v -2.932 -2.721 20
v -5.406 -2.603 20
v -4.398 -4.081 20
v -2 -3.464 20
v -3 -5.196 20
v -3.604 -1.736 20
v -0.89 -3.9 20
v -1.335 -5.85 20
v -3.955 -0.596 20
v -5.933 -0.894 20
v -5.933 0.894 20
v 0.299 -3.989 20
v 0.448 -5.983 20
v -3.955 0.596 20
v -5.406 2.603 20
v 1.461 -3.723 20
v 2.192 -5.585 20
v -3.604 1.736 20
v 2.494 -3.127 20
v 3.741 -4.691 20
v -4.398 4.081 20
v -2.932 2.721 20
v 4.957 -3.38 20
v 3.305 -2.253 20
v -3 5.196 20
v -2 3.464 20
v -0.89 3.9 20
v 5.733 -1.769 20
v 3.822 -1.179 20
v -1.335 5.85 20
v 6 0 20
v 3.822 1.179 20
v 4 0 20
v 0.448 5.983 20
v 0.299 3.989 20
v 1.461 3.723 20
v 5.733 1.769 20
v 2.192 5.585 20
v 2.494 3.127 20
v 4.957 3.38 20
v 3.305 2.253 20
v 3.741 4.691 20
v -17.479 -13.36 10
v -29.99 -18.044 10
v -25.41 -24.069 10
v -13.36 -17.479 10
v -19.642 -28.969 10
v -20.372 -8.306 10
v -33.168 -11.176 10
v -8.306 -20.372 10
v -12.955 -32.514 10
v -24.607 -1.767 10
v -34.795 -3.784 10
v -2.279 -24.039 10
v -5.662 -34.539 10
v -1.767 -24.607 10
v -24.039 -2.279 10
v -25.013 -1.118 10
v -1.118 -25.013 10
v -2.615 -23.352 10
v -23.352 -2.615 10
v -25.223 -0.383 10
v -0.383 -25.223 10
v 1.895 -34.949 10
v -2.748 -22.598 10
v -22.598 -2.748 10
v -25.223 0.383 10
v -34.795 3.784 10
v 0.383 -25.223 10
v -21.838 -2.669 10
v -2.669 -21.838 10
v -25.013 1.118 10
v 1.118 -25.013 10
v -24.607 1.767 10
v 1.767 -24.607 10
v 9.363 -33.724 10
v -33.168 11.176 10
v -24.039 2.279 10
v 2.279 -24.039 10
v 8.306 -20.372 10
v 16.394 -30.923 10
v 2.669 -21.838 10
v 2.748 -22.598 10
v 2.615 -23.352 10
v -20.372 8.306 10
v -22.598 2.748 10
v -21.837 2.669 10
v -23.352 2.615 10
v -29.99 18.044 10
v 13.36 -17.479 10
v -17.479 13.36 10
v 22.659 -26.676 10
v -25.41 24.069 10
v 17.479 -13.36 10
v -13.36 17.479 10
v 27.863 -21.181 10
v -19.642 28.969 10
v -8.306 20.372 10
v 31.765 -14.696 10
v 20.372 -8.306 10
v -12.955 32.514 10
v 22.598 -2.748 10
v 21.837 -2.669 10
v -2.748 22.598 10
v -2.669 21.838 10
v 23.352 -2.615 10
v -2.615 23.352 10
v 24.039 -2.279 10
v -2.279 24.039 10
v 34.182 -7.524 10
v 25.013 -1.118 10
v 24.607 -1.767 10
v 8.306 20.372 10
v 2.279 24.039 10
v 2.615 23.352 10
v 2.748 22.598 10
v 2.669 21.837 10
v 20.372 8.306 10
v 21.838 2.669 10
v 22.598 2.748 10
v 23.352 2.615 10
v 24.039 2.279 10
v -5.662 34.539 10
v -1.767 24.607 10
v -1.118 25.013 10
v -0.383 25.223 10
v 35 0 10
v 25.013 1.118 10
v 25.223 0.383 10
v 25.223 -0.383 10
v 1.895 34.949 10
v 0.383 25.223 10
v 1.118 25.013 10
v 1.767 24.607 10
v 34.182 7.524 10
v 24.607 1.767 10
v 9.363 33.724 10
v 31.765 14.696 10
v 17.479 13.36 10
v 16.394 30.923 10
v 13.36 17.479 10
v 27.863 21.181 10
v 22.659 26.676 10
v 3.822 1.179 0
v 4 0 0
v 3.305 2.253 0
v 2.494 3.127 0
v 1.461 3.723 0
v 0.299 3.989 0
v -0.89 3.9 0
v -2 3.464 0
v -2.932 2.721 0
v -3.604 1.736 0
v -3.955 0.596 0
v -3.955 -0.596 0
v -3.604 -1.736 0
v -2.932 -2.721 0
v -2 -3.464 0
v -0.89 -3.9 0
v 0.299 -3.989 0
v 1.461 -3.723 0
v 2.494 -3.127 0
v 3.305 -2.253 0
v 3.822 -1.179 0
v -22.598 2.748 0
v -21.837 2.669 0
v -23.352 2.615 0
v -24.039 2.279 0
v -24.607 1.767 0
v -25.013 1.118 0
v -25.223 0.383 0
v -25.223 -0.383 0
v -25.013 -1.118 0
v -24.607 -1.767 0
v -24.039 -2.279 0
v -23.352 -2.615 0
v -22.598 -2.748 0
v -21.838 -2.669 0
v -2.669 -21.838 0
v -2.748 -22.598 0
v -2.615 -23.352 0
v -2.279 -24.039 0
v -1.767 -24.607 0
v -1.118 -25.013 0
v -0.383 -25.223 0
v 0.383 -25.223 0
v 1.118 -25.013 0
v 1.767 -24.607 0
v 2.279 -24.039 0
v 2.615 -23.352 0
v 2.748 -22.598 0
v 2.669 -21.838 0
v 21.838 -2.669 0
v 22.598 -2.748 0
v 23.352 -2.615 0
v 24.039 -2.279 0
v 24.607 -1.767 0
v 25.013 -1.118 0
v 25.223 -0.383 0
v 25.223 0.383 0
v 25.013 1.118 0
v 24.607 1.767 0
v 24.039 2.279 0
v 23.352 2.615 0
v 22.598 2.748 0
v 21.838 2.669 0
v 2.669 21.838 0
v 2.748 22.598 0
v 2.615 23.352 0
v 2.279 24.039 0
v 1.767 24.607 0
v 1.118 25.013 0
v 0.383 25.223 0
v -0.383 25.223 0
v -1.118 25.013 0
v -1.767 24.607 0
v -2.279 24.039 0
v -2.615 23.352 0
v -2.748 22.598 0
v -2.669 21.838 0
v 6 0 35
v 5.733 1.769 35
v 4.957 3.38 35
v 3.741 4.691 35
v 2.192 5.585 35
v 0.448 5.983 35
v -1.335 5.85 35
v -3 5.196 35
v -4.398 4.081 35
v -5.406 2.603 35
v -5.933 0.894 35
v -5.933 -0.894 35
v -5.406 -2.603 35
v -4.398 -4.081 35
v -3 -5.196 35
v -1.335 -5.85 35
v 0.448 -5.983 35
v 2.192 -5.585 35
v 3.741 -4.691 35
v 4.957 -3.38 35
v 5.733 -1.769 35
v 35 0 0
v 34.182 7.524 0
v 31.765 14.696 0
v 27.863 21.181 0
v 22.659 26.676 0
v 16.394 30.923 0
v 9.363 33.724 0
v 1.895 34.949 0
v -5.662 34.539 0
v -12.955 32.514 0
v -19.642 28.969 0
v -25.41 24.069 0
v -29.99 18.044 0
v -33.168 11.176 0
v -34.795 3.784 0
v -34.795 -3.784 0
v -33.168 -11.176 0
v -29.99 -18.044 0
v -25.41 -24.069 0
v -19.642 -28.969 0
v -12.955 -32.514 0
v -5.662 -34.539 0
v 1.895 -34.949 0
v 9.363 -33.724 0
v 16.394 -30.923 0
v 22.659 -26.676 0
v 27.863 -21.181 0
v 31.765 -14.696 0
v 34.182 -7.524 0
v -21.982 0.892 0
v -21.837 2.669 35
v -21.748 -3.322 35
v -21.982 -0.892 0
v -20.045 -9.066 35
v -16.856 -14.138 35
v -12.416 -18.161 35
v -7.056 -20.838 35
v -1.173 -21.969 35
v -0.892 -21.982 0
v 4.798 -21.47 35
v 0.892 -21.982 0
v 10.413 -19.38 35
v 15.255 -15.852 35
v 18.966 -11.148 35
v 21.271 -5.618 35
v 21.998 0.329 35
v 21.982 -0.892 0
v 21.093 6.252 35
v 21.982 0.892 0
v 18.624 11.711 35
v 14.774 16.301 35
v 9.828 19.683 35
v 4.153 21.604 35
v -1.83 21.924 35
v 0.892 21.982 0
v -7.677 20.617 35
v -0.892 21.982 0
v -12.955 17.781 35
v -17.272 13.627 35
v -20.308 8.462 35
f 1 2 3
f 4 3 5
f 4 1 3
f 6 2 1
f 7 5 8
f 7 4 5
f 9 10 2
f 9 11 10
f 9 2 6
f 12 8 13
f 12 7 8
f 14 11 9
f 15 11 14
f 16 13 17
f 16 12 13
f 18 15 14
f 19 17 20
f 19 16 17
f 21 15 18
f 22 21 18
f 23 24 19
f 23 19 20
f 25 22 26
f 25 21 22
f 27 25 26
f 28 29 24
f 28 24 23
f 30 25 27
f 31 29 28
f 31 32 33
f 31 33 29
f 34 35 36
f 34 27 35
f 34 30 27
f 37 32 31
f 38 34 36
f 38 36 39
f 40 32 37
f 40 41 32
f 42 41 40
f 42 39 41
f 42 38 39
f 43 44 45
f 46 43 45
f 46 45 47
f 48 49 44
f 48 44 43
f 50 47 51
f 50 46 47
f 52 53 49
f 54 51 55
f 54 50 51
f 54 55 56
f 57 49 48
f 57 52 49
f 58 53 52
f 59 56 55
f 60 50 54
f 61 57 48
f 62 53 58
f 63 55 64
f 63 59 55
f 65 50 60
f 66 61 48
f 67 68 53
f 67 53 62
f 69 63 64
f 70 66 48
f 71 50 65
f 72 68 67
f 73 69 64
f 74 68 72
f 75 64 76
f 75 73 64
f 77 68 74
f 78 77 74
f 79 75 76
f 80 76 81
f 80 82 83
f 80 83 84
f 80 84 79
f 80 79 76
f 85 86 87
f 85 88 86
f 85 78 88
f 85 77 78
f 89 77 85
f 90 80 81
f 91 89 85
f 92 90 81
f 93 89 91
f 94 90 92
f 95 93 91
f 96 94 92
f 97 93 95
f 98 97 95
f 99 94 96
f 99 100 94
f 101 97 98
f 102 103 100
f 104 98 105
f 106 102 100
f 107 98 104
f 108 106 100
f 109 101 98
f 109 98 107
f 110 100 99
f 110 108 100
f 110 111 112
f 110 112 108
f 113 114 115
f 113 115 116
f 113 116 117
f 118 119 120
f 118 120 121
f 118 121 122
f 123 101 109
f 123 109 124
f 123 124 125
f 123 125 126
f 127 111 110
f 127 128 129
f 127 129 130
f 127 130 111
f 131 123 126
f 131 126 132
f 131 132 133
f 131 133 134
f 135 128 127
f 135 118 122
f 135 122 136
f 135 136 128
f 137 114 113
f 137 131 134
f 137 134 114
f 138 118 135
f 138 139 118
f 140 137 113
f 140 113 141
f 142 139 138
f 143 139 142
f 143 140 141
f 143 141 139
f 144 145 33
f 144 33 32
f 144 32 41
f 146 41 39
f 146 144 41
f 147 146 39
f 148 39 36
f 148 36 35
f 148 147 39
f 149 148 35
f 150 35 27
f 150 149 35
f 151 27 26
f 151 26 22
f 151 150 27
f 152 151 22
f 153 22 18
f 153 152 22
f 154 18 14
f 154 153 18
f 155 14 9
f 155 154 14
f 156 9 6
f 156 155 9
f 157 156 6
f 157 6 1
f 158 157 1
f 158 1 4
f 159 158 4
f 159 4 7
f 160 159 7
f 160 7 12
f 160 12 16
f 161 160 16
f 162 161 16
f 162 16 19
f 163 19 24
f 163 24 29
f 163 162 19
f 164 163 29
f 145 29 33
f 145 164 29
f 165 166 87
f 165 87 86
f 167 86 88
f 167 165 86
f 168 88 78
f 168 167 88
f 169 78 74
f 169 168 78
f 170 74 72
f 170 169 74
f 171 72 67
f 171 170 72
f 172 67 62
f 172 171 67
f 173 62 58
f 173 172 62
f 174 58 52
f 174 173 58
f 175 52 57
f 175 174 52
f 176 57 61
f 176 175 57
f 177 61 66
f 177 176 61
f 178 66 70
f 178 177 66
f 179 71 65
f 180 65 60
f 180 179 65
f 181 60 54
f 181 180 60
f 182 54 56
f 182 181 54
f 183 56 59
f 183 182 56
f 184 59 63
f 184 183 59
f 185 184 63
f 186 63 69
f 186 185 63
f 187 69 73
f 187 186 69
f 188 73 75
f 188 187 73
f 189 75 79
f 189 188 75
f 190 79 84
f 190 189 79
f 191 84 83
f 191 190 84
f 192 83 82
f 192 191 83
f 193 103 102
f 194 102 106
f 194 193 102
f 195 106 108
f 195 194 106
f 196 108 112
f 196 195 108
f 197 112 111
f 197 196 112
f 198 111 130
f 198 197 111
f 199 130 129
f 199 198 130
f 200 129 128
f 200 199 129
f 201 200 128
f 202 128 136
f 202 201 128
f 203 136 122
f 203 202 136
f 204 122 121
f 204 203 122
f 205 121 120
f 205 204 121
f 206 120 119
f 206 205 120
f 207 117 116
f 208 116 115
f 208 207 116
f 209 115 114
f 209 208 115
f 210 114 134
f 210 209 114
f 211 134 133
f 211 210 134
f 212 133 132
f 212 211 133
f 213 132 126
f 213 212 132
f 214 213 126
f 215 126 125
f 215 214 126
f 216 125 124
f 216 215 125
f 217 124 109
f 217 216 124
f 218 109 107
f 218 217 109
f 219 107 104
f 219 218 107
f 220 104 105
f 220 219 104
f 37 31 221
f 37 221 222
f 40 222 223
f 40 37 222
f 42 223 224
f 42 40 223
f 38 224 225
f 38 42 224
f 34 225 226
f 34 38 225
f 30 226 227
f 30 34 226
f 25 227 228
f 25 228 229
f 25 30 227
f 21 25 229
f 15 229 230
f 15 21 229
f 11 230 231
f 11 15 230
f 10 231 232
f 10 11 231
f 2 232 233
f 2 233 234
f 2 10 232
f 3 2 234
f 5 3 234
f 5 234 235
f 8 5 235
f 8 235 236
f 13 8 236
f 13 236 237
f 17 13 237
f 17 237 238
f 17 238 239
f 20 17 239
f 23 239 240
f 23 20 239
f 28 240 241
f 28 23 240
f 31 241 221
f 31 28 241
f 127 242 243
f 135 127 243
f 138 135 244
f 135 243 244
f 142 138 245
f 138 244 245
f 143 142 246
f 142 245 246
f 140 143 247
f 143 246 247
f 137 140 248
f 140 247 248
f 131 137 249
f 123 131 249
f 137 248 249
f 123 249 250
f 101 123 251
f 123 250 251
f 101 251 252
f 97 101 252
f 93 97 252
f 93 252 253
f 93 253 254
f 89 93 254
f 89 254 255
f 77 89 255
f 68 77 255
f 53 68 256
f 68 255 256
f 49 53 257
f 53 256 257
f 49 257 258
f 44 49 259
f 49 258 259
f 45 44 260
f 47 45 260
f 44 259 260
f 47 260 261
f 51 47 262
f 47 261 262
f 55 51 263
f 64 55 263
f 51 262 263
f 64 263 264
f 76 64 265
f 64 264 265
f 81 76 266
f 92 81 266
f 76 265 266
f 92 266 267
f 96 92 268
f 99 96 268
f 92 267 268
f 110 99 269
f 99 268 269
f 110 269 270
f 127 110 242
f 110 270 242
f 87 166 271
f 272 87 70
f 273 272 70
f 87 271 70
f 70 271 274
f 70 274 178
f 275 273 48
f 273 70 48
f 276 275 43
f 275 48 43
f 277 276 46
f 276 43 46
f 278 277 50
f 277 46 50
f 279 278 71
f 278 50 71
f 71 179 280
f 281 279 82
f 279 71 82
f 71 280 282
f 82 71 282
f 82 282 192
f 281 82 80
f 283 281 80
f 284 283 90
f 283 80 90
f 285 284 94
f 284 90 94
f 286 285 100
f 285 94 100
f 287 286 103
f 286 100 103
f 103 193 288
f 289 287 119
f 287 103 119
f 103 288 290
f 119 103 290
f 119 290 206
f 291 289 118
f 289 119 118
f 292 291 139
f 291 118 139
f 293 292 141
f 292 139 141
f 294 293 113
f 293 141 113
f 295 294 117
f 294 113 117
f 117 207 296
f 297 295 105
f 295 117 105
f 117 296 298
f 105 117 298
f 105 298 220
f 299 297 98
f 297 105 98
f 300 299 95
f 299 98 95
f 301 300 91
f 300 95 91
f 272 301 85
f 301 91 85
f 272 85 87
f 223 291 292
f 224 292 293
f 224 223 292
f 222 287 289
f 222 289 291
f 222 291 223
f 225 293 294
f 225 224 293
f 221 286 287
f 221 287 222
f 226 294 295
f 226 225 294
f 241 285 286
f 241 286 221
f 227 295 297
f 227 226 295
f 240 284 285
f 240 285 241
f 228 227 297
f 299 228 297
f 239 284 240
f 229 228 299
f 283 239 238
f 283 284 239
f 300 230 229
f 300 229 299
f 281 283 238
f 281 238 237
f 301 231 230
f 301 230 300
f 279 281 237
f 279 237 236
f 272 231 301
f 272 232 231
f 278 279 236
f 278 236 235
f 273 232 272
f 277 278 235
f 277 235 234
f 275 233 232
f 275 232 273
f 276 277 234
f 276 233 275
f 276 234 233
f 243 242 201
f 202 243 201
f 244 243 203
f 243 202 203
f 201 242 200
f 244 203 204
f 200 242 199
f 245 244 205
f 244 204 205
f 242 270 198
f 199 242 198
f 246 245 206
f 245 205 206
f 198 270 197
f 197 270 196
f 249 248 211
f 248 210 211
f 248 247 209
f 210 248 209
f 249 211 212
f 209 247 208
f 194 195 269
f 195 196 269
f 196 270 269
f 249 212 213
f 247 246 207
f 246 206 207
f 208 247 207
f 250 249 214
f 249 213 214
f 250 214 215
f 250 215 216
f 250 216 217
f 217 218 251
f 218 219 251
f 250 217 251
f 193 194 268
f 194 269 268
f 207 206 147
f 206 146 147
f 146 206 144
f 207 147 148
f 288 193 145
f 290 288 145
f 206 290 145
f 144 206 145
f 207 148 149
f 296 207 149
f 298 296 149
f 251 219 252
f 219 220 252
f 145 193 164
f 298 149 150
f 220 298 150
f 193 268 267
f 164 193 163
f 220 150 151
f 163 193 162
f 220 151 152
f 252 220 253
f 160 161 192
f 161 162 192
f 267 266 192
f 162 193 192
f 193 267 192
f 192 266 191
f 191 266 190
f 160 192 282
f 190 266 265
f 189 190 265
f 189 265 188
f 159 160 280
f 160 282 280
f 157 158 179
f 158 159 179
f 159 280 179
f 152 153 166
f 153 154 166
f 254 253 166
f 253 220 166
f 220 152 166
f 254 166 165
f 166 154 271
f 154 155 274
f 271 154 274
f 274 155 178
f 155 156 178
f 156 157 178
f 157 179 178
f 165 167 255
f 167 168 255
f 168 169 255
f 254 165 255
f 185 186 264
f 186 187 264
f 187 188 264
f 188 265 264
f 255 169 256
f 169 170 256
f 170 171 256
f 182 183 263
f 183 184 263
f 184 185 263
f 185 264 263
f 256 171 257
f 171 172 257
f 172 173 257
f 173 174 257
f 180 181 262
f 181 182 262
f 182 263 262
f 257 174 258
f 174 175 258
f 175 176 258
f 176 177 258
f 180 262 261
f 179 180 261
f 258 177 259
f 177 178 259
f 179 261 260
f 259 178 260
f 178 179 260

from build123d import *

# Parameters (mm, degrees)
SKETCH1_R           = 35
SKETCH1_R_2         = 6
SKETCH1_R_3         = 2.75
BOSS_EXTRUDE1_DEPTH = 10
SKETCH2_R           = 22
SKETCH2_R_2         = 6
BOSS_EXTRUDE2_DEPTH = 35
SKETCH3_R           = 12
SKETCH3_R_2         = 4
BOSS_EXTRUDE3_DEPTH = 20


with BuildPart() as part:
    # Sketch1 → Boss-Extrude1 (new body)
    with BuildSketch(Plane.XY):
        Circle(SKETCH1_R)
        Circle(SKETCH1_R_2, mode=Mode.SUBTRACT)
        with Locations((22.5, 0)):
            Circle(SKETCH1_R_3, mode=Mode.SUBTRACT)
        with Locations((0, 22.5)):
            Circle(SKETCH1_R_3, mode=Mode.SUBTRACT)
        with Locations((-22.5, 0)):
            Circle(SKETCH1_R_3, mode=Mode.SUBTRACT)
        with Locations((0, -22.5)):
            Circle(SKETCH1_R_3, mode=Mode.SUBTRACT)
    extrude(amount=BOSS_EXTRUDE1_DEPTH)

    # Sketch2 → Boss-Extrude2 (add)
    with BuildSketch(Plane.XY):
        Circle(SKETCH2_R)
        Circle(SKETCH2_R_2, mode=Mode.SUBTRACT)
    extrude(amount=BOSS_EXTRUDE2_DEPTH)

    # Sketch3 → Boss-Extrude3 (add)
    with BuildSketch(Plane.XY):
        Circle(SKETCH3_R)
        Circle(SKETCH3_R_2, mode=Mode.SUBTRACT)
    extrude(amount=BOSS_EXTRUDE3_DEPTH)


solid = part.part
